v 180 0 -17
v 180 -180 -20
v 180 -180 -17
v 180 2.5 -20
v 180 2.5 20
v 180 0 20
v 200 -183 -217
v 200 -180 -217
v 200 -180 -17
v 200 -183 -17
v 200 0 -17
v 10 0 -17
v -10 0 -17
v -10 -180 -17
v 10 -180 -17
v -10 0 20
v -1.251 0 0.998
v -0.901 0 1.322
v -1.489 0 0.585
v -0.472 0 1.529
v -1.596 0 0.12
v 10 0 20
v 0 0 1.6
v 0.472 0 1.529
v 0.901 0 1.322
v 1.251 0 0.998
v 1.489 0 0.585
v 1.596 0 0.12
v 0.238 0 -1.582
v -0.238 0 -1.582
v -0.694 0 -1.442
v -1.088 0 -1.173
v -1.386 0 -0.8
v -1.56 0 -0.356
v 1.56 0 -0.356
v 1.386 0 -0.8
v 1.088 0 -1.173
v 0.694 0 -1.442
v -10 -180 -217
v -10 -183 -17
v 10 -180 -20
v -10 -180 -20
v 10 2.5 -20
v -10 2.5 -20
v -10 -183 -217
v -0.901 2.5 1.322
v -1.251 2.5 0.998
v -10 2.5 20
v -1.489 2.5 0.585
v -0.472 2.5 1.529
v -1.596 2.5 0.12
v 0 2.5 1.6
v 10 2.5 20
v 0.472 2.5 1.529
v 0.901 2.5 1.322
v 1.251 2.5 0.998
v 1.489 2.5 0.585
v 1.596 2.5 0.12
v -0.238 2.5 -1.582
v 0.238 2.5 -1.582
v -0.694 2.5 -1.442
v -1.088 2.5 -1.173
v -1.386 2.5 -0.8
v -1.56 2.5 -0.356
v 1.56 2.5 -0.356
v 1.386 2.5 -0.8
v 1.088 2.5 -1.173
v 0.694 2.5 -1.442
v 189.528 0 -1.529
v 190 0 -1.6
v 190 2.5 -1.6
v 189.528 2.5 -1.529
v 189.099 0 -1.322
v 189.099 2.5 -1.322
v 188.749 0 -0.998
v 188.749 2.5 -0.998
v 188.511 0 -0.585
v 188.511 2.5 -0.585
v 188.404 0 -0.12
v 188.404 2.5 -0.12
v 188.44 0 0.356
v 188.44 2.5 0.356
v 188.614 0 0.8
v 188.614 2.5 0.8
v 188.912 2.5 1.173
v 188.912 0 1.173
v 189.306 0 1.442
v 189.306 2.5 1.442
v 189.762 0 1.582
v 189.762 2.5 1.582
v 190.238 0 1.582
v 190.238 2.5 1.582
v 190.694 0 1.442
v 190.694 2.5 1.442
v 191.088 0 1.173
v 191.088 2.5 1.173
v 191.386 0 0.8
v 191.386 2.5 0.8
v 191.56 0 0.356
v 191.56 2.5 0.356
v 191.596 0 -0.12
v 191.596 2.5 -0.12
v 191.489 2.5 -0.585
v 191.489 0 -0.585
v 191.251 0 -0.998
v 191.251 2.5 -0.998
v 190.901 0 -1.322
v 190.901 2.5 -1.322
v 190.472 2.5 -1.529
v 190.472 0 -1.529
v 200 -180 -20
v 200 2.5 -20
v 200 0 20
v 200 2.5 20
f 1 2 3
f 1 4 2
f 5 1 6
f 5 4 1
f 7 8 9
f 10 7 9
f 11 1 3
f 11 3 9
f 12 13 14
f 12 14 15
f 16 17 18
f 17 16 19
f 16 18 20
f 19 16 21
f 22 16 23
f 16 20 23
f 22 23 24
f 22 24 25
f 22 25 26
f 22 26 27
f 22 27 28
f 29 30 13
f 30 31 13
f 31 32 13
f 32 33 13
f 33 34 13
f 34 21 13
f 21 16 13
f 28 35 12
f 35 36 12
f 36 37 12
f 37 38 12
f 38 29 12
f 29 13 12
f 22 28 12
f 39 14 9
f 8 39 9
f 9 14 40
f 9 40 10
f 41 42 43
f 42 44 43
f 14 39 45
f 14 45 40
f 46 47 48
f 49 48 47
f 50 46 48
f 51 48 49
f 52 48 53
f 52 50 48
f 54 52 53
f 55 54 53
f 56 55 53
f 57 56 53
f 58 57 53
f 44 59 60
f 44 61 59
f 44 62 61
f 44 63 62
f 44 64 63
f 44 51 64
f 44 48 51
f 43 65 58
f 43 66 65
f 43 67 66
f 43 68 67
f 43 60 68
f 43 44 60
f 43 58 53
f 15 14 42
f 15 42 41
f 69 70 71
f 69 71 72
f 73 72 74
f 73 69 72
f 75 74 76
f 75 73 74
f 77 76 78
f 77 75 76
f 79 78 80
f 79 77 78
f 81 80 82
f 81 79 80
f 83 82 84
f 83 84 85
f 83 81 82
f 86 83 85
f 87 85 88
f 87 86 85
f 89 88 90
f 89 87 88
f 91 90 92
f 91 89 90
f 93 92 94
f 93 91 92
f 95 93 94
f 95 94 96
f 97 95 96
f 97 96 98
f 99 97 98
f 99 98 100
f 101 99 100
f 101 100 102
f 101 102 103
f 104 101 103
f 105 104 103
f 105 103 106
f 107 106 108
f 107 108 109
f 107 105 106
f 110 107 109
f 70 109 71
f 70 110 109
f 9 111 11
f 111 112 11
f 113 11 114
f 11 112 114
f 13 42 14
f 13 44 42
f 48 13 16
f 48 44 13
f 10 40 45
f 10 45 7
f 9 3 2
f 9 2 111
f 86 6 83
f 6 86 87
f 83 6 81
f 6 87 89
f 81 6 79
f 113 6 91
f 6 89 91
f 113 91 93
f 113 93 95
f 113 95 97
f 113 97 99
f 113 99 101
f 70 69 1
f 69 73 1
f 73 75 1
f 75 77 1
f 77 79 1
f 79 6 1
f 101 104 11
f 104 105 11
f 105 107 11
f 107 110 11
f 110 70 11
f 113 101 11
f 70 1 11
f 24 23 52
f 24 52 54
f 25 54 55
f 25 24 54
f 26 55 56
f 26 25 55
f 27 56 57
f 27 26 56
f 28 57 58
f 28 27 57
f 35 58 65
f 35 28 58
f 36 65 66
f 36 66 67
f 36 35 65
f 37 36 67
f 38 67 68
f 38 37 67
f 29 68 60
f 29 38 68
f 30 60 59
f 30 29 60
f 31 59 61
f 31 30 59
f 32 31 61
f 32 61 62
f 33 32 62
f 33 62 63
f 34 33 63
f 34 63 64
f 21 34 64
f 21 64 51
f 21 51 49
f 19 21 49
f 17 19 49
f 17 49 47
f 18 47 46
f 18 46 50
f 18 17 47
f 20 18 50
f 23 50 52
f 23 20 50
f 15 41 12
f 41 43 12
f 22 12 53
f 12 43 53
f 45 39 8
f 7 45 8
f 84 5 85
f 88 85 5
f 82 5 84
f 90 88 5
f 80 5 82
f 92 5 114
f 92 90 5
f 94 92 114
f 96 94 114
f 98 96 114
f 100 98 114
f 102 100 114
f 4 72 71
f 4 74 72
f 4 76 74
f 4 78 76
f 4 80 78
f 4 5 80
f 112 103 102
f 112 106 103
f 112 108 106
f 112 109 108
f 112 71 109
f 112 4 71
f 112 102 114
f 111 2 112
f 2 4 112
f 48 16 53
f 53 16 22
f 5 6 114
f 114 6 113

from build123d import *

# Parameters (mm, degrees)
SKETCH_1_W        = 20
SKETCH_1_H        = 40
SKETCH_1_R        = 1.6
EXTRUDE_1_DEPTH   = 2.5
EXTRUDE_1_2_DEPTH = 2.5
SKETCH_2_W        = 20
SKETCH_2_H        = 3
EXTRUDE_2_DEPTH   = 180
SKETCH_3_W        = 210
SKETCH_3_H        = 200
EXTRUDE_3_DEPTH   = 3


with BuildPart() as part:
    # 草图1 → 凸台-拉伸1 (new body)
    with BuildSketch(Plane(origin=(0, 0, 0), x_dir=(1, 0, 0), z_dir=(0, 1, 0))):
        Rectangle(SKETCH_1_W, SKETCH_1_H)
        with Locations(Location((0, 0, 0), (0, 0, 270))):
            Circle(SKETCH_1_R, mode=Mode.SUBTRACT)
    extrude(amount=EXTRUDE_1_DEPTH)



with BuildPart() as body_2:
    # 草图1 → Extrude 1 2 (new body)
    with BuildSketch(Plane(origin=(0, 0, 0), x_dir=(1, 0, 0), z_dir=(0, 1, 0))):
        with Locations((190, 0)):
            Rectangle(SKETCH_1_W, SKETCH_1_H)
        with Locations(Location((190, 0, 0), (0, 0, 90))):
            Circle(SKETCH_1_R, mode=Mode.SUBTRACT)
    extrude(amount=EXTRUDE_1_2_DEPTH)


with BuildPart() as part_1:
    add(part.part)

    add(body_2.part)  # 凸台-拉伸2 merges body 2
    # 草图2 → 凸台-拉伸2 (add)
    with BuildSketch(Plane.XZ):
        with Locations((0, -18.5)):
            Rectangle(SKETCH_2_W, SKETCH_2_H)
        with Locations((190, -18.5)):
            Rectangle(SKETCH_2_W, SKETCH_2_H)
    extrude(amount=EXTRUDE_2_DEPTH)


with BuildPart() as body_2_2:
    # 草图3 → 凸台-拉伸3 (new body)
    with BuildSketch(Plane.XZ.offset(180)):
        with Locations((95, -117)):
            Rectangle(SKETCH_3_W, SKETCH_3_H)
    extrude(amount=EXTRUDE_3_DEPTH)


solid = Compound([part_1.part, body_2_2.part])
